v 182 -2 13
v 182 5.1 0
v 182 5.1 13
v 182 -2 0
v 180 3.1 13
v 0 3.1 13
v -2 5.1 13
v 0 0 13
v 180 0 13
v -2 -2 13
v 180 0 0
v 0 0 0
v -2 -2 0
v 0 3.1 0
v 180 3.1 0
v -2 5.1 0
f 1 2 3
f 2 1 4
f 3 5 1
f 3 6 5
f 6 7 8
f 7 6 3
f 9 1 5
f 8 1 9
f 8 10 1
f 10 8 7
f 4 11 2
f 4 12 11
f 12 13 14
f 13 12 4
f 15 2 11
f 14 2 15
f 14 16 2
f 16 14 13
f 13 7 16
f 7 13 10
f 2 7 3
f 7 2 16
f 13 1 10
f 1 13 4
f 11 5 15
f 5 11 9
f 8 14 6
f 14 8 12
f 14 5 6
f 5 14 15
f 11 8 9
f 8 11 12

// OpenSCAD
mag_x = 60;
mag_y = 3.1;
mag_z = 13;
nMag = 3;
bobbin_wall = 2;

difference(){
    positives();
    negatives();
}

module positives(){
    translate([-bobbin_wall,-bobbin_wall,0]) cube([nMag*mag_x+2*bobbin_wall,mag_y+2*bobbin_wall,mag_z]);
}

module negatives(){
    translate([0,0,0]) cube([nMag*mag_x,mag_y,mag_z]);
}
